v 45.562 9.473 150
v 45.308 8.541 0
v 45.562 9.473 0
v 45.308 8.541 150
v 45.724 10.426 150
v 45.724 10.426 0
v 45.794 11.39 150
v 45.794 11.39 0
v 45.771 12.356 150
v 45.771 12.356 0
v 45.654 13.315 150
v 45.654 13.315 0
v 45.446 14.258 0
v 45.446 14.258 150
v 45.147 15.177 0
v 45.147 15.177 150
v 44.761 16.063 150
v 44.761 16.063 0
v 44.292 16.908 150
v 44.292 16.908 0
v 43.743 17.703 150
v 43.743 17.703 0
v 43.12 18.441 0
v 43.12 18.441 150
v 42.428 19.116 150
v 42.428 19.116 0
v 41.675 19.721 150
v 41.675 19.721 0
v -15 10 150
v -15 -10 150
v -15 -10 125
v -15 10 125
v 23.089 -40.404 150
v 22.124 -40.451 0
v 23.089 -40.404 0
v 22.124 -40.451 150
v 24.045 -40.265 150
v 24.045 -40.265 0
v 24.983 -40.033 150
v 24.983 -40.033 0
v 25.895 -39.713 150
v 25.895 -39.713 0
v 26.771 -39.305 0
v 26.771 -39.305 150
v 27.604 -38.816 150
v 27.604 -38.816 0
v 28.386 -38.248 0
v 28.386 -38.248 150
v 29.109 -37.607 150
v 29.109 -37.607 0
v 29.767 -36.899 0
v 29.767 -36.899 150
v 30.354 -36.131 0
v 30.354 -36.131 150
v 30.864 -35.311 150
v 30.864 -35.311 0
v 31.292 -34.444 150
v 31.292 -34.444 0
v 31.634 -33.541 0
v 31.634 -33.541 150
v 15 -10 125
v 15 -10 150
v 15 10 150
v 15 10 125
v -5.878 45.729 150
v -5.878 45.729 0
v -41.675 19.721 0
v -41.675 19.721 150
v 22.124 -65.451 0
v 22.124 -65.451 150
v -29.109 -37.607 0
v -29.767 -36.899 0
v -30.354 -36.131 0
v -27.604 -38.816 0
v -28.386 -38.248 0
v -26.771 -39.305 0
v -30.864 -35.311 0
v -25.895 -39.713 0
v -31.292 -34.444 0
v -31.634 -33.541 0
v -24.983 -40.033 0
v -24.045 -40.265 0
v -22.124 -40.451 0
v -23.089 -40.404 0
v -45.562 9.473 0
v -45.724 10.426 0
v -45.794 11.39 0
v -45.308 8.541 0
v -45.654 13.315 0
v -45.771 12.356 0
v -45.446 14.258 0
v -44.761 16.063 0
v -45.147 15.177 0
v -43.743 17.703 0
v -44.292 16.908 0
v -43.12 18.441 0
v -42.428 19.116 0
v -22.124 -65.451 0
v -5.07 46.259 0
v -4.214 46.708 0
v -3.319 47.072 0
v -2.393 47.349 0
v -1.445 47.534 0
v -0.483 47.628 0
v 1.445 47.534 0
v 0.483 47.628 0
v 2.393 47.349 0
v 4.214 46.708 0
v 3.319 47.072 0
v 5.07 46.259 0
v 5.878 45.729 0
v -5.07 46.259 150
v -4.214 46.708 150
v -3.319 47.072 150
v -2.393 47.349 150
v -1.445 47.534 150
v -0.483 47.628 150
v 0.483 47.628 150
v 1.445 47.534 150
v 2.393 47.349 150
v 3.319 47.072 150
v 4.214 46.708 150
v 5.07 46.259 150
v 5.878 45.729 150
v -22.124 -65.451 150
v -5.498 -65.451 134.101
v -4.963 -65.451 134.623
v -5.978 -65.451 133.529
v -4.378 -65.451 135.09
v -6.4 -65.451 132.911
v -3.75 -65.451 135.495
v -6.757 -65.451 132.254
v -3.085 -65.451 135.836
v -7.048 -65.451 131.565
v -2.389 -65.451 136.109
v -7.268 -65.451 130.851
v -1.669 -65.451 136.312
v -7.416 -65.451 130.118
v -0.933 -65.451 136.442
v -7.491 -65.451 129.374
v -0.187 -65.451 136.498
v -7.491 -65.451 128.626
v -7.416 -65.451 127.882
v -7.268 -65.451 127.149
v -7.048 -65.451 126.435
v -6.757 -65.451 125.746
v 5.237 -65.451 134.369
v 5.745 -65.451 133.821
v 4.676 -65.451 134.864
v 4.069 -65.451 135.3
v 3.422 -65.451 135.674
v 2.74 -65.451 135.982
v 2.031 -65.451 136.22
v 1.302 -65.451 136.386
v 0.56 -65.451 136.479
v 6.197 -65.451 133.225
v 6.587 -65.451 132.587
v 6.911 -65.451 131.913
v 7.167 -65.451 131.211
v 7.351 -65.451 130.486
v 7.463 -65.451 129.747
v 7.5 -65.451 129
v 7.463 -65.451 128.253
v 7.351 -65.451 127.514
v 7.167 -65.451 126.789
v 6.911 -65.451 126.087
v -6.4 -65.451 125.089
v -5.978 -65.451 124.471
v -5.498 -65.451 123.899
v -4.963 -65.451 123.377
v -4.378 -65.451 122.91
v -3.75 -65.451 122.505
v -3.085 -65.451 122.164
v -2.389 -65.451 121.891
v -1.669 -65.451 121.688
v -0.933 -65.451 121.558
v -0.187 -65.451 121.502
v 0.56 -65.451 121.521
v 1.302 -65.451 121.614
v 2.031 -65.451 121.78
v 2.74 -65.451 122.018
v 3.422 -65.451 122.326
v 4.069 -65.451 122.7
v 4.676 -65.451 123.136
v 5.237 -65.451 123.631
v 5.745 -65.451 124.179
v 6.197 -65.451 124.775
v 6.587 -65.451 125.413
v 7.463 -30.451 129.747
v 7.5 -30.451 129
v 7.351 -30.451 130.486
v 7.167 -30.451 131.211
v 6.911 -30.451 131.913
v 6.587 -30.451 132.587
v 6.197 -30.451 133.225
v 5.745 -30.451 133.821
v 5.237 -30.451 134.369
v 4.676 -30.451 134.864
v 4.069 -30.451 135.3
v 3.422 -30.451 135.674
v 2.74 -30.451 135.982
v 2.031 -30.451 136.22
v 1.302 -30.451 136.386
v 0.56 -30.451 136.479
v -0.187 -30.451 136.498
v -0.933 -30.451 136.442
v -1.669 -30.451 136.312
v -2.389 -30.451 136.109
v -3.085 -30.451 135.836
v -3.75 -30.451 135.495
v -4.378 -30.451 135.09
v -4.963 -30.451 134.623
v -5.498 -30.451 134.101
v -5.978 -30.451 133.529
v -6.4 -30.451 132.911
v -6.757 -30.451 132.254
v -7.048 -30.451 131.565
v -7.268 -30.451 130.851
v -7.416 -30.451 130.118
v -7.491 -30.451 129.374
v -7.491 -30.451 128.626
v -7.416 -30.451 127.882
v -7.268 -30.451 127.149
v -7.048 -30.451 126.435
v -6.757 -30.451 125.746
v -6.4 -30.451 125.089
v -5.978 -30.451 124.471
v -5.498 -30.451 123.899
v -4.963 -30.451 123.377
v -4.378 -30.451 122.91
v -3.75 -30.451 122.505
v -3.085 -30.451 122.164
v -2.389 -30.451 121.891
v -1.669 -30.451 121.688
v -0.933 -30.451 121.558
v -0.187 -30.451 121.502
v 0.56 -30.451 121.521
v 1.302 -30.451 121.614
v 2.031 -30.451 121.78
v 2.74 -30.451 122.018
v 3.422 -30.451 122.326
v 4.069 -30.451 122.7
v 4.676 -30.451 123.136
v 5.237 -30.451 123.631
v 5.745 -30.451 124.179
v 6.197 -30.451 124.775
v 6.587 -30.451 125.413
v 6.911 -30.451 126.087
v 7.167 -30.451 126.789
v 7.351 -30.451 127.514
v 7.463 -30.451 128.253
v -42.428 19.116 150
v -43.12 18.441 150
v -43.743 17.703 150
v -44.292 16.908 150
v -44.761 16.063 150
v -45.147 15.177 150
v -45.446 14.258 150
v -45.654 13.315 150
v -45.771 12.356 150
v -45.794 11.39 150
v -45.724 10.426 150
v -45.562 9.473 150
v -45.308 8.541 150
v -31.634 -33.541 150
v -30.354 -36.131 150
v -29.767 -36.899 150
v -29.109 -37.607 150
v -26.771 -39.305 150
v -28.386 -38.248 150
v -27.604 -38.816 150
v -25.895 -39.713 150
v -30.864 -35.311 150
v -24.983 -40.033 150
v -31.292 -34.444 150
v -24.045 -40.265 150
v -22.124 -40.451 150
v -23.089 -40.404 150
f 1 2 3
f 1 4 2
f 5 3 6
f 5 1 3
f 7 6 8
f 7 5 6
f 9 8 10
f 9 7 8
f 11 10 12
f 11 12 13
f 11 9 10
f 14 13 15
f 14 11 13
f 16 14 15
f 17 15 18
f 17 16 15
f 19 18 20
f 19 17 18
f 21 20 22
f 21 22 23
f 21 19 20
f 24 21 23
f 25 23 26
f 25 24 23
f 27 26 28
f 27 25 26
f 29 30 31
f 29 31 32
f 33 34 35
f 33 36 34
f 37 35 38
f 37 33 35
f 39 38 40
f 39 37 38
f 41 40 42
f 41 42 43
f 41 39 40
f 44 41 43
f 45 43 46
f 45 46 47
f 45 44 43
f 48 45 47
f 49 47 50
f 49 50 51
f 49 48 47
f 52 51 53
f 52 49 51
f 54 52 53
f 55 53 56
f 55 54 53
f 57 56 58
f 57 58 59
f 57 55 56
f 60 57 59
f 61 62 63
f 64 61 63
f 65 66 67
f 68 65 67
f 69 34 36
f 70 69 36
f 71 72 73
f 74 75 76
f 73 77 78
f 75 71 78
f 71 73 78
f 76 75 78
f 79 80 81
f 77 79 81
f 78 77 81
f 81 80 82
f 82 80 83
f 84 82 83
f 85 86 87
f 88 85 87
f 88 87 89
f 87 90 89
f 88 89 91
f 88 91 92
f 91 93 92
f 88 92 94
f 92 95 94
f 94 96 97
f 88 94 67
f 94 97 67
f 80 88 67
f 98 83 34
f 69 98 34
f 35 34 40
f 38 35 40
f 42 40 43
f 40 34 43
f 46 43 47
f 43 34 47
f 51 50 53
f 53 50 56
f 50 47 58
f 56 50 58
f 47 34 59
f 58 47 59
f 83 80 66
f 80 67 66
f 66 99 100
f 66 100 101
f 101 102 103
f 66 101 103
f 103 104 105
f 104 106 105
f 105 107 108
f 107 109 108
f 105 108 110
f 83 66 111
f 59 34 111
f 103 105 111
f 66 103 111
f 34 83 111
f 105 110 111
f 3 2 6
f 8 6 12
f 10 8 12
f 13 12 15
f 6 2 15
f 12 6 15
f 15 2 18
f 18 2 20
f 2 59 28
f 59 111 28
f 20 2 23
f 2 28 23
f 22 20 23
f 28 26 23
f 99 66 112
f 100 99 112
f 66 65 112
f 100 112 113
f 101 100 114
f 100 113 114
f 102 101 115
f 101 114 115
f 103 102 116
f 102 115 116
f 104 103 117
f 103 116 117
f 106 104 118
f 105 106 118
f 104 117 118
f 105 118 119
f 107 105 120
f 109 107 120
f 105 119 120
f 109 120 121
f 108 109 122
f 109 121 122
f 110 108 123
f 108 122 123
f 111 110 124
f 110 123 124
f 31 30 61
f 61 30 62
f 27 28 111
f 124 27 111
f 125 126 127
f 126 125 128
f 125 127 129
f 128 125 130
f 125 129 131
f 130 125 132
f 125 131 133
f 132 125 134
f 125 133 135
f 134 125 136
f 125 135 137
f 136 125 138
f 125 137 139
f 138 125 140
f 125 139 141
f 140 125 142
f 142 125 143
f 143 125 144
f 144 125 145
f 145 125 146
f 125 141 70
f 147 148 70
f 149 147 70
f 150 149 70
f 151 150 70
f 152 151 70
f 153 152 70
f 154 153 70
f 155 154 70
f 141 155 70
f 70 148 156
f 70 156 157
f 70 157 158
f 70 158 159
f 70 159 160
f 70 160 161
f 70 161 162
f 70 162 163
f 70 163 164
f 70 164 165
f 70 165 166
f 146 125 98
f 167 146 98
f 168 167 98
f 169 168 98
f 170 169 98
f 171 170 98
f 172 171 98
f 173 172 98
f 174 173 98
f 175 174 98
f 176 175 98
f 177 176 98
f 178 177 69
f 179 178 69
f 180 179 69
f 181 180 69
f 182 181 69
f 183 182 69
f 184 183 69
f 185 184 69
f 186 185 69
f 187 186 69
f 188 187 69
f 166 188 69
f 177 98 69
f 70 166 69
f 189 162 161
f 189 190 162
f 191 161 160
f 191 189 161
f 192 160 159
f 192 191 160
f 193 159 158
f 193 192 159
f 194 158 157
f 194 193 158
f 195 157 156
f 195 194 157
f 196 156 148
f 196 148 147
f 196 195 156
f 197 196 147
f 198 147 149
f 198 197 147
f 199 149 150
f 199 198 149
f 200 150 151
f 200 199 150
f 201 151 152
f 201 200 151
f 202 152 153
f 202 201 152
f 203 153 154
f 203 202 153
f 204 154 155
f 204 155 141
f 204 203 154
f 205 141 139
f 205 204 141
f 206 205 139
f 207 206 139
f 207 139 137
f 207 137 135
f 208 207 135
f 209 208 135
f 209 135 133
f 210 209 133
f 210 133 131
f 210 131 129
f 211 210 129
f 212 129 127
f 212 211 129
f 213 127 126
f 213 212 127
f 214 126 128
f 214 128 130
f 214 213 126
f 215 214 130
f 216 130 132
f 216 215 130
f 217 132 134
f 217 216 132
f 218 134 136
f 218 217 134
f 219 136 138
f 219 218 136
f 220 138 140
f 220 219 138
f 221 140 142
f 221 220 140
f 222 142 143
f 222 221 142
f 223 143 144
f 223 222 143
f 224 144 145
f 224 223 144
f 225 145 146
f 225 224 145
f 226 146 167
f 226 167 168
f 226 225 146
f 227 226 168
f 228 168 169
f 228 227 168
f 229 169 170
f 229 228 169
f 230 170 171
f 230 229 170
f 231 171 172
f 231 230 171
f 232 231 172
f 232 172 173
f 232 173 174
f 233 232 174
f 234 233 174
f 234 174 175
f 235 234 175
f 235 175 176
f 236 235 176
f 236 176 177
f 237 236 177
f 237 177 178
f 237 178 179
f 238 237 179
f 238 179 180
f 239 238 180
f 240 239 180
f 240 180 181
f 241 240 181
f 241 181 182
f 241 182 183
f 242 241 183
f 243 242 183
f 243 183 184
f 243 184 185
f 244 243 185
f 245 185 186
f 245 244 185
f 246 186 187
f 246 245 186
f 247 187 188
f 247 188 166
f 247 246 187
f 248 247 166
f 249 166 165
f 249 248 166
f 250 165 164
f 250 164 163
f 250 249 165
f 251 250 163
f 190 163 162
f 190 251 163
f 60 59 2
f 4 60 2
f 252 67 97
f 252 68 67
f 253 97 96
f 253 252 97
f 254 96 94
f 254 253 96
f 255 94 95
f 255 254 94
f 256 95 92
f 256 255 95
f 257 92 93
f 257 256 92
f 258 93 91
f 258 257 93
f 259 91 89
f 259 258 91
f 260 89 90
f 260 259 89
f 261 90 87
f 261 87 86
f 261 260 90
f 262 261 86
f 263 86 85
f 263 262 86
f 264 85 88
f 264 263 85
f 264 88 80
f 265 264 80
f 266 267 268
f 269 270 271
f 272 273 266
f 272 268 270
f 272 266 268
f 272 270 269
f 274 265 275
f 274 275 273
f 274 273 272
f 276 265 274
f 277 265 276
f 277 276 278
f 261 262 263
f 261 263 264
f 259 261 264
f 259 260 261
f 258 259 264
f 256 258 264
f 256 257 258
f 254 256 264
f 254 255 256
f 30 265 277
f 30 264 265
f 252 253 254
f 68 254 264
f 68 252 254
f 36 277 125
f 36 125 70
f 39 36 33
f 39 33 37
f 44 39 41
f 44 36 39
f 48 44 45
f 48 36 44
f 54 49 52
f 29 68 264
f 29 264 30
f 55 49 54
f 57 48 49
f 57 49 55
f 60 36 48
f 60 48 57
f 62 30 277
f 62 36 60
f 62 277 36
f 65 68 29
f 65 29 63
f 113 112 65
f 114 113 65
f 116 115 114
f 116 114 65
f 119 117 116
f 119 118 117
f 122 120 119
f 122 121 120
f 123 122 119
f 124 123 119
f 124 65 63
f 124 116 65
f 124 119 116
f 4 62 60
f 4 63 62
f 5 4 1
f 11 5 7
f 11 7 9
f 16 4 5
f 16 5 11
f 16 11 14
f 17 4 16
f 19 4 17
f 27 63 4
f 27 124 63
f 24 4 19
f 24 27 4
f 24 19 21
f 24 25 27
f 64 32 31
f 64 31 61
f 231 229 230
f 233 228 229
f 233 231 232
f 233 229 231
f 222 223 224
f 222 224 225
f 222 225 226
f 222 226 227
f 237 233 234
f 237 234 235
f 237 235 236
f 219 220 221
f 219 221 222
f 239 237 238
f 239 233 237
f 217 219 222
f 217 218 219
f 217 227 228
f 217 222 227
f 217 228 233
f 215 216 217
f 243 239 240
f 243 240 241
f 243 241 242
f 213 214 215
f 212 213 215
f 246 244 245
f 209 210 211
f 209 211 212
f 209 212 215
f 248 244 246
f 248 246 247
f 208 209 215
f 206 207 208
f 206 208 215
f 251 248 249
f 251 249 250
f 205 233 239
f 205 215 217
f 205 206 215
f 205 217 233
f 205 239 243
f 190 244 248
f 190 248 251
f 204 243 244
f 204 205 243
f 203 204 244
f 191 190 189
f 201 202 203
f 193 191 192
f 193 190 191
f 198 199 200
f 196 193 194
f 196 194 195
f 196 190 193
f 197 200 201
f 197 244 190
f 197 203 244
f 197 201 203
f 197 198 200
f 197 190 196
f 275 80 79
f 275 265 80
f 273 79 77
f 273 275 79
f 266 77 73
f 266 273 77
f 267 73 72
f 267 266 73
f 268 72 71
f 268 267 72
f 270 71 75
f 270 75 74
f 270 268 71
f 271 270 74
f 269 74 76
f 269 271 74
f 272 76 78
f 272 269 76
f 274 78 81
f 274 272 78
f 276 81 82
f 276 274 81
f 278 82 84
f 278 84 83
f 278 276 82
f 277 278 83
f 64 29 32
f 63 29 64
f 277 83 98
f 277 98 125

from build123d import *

# Parameters (mm, degrees)
F1_DEPTH = 150
F2_R     = 10
F4_W     = 30
F4_H     = 20
F5_DEPTH = 25
F6_R     = 7.5
F7_DEPTH = 10
F8_DEPTH = 25


with BuildPart() as f1:
    # F0 (on Top) → F1 (new body)
    with BuildSketch(Plane.XY):
        Polygon((0, 50), (-47.5528258148, 15.4508497187), (-29.3892626146, -40.4508497187), (29.3892626146, -40.4508497187), (47.5528258148, 15.4508497187), align=None)
    extrude(amount=F1_DEPTH)

    # F2
    f2_edges = [f1.edges().sort_by_distance(p)[0] for p in [
        (-29.389263, -40.45085, 75),
        (-47.552826, 15.45085, 75),
        (0, 50, 75),
        (47.552826, 15.45085, 75),
        (29.389263, -40.45085, 75),
    ]]
    fillet(f2_edges, radius=F2_R)

    # F4 (on face) → F5 (cut)
    with BuildSketch(Plane.XY.offset(150)):
        Rectangle(F4_W, F4_H)
    extrude(amount=-F5_DEPTH, mode=Mode.SUBTRACT)

    # F6 (on face) → F7 (cut)
    with BuildSketch(Plane.XZ.offset(40.4508497187)):
        with Locations((0, 129)):
            Circle(F6_R)
    extrude(amount=-F7_DEPTH, mode=Mode.SUBTRACT)

    # F8 (add): a face of the model
    f8_faces = [f1.faces().sort_by_distance(p)[0] for p in [
        (0, -40.4508497187, 73.5229190756),
    ]]
    extrude(f8_faces, amount=F8_DEPTH)


solid = f1.part
